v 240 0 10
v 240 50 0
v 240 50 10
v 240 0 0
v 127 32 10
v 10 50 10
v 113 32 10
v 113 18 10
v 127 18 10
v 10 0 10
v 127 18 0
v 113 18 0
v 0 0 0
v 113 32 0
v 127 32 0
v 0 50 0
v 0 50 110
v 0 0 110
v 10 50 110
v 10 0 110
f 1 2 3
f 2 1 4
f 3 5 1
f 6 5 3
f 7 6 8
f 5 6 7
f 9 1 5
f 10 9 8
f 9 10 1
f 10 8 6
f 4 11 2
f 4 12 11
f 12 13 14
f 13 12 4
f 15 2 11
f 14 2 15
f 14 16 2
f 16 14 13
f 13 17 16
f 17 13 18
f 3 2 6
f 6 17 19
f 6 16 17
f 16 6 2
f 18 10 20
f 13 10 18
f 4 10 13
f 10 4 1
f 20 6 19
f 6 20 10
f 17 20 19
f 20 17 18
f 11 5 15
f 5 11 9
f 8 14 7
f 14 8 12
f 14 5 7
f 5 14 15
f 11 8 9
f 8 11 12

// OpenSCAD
$fn = 32;

// ----------------------------------------------------------------------
// Gantry bracket: 200-250 mm L bracket
// ----------------------------------------------------------------------

// --- parameters (mm) ---
base_l = 240;             // base arm length, X
arm_w = 50;               // arm width, Y
thick = 10;               // arm thickness
up_h = 100;               // vertical arm height, Z
slot_w = 14;              // adjustment slot width in the base

total_h = up_h + thick;  // overall height

difference() {
  union() {
    cube([base_l, arm_w, thick]);
    cube([thick, arm_w, total_h]);
  }
  translate([base_l / 2 - slot_w / 2, arm_w / 2 - slot_w / 2, -1])
    cube([slot_w, slot_w, thick + 2]);
}
